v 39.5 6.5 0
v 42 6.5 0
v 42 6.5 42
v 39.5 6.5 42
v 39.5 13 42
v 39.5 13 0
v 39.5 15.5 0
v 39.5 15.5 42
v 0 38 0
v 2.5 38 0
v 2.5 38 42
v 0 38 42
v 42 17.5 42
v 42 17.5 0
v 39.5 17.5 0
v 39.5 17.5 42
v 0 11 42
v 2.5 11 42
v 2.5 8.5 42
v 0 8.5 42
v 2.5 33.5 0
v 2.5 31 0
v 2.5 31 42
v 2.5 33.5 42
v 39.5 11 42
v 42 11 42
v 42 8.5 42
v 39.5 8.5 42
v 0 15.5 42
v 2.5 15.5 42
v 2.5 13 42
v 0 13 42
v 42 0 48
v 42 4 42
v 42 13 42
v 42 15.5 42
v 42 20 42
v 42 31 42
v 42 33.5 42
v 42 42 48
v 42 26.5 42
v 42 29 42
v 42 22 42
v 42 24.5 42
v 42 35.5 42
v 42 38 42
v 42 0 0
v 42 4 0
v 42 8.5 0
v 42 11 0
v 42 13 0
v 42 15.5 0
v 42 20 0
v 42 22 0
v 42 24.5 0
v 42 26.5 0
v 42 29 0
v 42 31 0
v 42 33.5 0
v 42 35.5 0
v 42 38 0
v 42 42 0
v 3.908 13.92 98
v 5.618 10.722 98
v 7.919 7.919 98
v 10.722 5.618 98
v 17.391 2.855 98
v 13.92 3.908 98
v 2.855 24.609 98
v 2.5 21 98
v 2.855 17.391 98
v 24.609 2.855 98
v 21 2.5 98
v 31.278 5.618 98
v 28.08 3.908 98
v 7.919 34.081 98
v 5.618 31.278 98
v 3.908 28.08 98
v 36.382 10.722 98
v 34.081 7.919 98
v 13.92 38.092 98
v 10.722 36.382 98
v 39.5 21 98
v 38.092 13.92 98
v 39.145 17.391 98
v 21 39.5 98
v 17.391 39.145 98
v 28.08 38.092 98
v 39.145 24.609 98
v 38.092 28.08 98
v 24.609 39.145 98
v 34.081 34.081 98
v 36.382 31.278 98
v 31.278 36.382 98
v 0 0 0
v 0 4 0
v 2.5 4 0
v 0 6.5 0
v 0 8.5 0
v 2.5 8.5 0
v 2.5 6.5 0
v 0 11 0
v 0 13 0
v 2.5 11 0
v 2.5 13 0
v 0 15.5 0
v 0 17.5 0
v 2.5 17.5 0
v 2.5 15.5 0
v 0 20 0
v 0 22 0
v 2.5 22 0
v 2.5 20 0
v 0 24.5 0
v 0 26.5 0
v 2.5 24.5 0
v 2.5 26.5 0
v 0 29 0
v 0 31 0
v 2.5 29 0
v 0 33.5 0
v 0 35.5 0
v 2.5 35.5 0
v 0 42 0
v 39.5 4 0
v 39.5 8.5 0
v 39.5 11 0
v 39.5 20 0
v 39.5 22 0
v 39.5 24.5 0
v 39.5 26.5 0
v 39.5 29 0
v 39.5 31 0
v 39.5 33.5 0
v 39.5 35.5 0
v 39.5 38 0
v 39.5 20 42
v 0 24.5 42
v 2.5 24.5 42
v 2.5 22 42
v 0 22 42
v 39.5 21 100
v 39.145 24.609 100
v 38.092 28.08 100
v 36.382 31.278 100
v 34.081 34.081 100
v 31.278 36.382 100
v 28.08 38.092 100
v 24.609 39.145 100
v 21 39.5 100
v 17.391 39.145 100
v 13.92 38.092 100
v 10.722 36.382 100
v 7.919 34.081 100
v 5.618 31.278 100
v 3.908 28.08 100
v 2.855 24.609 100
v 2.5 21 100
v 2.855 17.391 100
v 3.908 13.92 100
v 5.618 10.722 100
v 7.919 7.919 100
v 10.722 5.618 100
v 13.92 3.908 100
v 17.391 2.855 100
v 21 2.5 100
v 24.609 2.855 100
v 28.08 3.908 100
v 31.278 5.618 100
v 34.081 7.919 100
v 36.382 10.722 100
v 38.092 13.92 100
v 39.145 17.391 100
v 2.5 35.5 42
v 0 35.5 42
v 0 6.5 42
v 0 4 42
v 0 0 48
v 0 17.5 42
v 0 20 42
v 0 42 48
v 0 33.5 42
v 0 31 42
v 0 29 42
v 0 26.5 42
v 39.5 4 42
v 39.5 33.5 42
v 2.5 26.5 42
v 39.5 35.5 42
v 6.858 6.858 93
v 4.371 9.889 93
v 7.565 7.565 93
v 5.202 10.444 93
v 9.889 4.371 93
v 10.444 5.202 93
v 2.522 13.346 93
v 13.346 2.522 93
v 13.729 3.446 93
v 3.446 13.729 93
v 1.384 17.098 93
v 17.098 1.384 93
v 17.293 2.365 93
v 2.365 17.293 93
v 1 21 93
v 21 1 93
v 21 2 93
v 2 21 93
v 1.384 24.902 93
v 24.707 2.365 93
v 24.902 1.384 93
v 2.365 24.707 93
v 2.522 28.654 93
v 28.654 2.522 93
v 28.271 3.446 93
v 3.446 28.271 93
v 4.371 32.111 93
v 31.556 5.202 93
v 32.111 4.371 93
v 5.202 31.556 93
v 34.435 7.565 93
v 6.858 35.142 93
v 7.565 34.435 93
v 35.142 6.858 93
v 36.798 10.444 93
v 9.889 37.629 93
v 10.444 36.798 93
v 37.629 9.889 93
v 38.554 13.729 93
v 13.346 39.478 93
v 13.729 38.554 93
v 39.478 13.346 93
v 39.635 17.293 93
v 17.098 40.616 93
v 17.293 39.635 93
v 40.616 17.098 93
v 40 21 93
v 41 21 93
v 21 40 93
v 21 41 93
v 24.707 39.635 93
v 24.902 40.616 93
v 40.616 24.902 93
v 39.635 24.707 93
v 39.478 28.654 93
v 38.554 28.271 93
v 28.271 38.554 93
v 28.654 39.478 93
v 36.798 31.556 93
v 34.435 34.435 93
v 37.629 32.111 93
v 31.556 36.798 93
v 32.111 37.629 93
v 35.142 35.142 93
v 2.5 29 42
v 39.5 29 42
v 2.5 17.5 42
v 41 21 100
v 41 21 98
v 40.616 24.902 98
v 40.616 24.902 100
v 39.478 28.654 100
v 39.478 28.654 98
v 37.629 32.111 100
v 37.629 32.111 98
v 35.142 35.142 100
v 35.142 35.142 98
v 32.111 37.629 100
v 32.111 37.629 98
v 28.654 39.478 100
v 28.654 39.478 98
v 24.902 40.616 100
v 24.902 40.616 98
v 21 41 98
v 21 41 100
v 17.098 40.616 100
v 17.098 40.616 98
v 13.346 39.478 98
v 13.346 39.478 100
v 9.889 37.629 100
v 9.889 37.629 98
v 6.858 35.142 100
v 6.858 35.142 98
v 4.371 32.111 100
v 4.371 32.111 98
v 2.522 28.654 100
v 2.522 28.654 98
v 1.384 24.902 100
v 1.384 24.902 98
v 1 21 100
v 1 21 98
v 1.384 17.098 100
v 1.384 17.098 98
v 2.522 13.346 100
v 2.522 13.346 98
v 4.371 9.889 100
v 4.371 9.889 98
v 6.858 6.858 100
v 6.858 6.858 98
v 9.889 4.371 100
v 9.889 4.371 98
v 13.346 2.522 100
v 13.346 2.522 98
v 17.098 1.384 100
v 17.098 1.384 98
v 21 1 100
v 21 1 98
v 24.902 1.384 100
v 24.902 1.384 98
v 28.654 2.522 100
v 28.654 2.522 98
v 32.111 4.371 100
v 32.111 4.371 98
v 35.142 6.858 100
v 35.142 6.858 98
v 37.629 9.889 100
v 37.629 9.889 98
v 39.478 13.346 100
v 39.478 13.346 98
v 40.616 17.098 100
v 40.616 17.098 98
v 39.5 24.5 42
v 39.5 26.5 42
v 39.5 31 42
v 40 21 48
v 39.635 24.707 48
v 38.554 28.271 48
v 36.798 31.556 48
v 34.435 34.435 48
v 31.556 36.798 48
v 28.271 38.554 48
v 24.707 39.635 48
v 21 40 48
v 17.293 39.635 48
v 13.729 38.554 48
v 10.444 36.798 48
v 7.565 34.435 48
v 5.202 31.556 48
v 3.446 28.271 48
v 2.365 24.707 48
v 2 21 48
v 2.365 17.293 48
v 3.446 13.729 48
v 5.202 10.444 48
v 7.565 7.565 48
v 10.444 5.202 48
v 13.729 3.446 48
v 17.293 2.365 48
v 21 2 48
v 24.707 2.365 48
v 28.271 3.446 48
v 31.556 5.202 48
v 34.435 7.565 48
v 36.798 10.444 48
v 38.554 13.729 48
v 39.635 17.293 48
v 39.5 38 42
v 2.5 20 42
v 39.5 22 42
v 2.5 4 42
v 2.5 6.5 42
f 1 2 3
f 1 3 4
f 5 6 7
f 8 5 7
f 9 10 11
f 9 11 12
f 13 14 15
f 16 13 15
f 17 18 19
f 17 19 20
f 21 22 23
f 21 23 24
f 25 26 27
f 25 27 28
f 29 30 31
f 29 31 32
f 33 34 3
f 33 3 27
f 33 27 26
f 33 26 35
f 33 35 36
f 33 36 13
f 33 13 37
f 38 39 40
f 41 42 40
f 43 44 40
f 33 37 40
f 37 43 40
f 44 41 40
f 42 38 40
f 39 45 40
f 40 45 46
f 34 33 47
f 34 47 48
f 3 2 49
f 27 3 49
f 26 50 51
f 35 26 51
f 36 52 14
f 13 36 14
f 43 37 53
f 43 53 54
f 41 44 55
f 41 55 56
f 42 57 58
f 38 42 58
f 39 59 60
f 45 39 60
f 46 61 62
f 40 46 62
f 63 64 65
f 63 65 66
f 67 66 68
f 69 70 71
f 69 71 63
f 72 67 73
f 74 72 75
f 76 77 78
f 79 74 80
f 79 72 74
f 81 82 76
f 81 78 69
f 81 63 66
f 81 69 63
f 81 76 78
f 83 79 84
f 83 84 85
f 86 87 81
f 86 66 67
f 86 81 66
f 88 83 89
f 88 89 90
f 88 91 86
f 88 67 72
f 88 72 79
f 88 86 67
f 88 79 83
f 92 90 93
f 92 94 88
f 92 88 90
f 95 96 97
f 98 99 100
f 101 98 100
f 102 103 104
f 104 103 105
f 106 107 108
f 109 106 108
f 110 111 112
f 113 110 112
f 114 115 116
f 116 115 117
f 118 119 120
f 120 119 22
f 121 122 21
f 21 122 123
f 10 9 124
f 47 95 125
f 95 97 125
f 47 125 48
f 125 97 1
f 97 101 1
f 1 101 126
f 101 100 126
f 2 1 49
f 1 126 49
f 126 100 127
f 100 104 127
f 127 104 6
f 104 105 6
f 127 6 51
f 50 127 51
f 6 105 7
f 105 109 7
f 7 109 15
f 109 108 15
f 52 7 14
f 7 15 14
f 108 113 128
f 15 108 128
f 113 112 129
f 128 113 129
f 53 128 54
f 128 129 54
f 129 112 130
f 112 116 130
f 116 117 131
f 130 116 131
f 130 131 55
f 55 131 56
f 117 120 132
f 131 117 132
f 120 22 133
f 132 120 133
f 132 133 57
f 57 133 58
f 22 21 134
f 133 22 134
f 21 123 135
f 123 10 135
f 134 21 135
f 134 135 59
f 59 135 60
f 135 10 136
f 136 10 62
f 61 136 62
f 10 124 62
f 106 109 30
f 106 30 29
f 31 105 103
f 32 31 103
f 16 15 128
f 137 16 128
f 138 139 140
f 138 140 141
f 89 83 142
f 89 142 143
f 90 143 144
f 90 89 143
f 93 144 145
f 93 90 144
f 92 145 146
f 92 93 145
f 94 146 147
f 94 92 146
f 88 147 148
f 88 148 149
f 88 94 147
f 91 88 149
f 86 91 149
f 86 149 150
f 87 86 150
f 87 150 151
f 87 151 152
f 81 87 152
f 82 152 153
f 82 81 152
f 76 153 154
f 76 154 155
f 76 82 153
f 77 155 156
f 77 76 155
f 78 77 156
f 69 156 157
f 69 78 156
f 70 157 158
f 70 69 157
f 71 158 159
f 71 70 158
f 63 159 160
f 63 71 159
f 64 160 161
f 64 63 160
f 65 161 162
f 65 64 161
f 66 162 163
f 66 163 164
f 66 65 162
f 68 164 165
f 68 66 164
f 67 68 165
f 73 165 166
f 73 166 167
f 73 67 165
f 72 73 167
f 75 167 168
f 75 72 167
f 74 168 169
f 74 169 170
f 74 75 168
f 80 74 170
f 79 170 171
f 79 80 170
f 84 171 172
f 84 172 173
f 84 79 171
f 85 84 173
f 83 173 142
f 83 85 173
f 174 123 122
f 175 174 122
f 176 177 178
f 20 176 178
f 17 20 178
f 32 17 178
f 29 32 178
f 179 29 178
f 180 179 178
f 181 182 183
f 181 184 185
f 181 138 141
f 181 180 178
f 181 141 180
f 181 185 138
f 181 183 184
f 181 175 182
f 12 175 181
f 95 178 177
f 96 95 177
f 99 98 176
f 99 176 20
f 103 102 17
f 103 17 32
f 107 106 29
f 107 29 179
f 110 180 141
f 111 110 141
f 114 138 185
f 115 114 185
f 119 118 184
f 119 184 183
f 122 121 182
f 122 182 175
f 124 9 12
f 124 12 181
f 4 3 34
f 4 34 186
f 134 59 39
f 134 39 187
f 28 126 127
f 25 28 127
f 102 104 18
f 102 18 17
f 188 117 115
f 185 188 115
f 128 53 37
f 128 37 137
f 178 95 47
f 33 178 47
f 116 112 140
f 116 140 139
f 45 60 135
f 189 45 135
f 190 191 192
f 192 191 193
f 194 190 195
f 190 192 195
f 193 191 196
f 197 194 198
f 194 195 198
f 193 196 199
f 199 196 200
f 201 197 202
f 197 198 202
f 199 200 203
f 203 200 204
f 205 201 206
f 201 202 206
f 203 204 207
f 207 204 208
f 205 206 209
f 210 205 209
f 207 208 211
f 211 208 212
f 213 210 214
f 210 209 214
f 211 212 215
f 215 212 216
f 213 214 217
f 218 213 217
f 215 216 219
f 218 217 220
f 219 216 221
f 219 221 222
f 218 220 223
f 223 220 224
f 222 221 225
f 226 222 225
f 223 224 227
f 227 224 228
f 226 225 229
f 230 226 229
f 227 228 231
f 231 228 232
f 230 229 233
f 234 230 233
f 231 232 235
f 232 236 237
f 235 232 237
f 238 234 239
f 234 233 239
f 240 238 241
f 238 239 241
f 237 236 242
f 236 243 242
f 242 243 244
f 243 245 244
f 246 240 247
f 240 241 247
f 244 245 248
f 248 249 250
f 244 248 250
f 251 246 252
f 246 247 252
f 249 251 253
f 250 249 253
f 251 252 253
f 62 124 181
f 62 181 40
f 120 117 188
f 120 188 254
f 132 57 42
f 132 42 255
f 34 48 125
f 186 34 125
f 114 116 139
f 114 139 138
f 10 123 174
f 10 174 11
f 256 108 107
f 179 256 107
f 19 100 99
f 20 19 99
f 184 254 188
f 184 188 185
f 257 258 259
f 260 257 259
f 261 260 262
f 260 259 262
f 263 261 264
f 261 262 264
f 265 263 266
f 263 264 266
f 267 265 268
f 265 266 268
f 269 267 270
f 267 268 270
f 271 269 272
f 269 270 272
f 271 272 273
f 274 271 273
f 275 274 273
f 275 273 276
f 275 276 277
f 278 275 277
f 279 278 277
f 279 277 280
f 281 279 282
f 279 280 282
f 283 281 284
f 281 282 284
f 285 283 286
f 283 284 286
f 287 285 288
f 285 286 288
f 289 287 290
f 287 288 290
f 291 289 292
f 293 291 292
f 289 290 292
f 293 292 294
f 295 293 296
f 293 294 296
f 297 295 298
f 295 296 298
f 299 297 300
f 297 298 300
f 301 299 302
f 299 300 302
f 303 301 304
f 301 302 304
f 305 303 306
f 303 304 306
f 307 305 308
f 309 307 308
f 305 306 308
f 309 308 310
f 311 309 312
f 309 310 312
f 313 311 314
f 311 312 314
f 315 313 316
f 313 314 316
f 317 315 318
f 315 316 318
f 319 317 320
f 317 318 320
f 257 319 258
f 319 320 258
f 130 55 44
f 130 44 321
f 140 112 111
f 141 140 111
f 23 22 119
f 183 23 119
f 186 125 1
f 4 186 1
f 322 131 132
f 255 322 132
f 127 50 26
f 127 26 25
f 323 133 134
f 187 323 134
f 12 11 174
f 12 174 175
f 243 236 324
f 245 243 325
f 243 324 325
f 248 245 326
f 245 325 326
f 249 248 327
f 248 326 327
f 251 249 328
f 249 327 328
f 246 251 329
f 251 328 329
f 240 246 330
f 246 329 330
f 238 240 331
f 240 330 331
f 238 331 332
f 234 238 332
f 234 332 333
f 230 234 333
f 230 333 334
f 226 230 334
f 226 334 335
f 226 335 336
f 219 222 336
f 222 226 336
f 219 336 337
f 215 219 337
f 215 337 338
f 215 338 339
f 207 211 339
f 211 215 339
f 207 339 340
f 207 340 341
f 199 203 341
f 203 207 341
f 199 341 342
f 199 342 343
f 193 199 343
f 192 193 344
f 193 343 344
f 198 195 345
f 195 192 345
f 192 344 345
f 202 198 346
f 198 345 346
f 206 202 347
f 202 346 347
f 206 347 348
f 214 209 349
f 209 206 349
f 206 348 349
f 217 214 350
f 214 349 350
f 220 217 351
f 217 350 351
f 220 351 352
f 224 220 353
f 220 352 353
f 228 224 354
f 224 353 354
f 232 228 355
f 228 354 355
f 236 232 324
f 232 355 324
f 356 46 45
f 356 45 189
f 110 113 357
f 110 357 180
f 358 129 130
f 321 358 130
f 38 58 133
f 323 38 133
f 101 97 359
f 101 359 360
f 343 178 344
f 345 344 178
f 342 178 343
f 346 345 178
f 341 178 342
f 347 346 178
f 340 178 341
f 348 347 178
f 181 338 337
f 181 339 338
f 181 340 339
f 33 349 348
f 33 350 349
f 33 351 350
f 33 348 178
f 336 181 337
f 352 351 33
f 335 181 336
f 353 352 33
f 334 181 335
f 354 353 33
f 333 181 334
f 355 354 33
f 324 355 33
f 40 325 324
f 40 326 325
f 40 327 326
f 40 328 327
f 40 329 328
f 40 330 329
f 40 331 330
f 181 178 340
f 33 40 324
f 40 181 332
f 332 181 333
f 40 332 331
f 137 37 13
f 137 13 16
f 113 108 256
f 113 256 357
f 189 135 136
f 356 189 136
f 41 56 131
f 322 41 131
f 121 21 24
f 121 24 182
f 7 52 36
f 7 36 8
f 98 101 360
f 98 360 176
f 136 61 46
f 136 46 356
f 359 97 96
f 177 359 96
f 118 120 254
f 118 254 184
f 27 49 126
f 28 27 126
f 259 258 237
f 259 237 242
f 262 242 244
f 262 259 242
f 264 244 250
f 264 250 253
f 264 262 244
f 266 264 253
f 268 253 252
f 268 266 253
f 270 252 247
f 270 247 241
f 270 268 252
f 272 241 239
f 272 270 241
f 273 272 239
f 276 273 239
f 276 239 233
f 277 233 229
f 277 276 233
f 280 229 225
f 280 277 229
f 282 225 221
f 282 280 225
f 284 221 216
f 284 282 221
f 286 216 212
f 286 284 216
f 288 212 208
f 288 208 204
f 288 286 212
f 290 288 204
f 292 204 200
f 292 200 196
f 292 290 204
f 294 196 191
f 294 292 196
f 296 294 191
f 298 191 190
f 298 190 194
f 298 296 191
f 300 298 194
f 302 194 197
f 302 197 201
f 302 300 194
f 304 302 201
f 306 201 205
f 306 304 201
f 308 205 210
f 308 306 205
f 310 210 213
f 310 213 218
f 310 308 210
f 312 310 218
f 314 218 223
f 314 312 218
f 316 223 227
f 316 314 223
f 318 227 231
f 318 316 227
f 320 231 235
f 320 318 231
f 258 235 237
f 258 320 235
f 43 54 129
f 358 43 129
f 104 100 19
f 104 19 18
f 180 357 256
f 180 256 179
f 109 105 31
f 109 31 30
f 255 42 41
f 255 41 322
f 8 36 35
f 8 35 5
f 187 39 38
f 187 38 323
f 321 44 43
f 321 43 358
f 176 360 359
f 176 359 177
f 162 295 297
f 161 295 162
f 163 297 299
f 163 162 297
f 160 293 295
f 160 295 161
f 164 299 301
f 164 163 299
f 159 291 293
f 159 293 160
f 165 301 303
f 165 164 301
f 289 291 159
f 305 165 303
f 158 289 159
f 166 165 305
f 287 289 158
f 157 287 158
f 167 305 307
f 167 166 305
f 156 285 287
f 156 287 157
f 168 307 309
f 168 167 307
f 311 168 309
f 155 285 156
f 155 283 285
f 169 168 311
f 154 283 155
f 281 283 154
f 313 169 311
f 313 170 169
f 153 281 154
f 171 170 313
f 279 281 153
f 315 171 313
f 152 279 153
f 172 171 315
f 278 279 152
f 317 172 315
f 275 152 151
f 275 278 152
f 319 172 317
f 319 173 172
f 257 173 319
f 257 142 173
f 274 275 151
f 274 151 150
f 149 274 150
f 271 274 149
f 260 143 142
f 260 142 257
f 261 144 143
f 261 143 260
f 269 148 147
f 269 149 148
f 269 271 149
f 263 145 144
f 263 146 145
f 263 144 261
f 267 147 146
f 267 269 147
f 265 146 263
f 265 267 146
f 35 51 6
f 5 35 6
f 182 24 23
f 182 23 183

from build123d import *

# Parameters (mm, degrees)
SKETCH2_W           = 42
SKETCH2_H           = 42
BOSS_EXTRUDE1_DEPTH = 48
SKETCH3_R           = 19
BOSS_EXTRUDE2_DEPTH = 50
SKETCH4_R           = 20
SKETCH4_R_2         = 18.5
BOSS_EXTRUDE3_DEPTH = 5
SKETCH5_R           = 20
SKETCH5_R_2         = 18.5
BOSS_EXTRUDE4_DEPTH = 2
SKETCH6_W           = 2.5
SKETCH6_H           = 2.5
CUT_EXTRUDE1_DEPTH  = 42


with BuildPart() as part:
    # Sketch2 → Boss-Extrude1 (new body)
    with BuildSketch(Plane.XY):
        with Locations((21, 21)):
            Rectangle(SKETCH2_W, SKETCH2_H)
    extrude(amount=BOSS_EXTRUDE1_DEPTH)

    # Sketch3 → Boss-Extrude2 (add)
    with BuildSketch(Plane.XY.offset(48)):
        with Locations((21, 21)):
            Circle(SKETCH3_R)
    extrude(amount=BOSS_EXTRUDE2_DEPTH)



with BuildPart() as body_2:
    # Sketch4 → Boss-Extrude3 (new body)
    with BuildSketch(Plane.XY.offset(98)):
        with Locations((21, 21)):
            Circle(SKETCH4_R)
        with Locations((21, 21)):
            Circle(SKETCH4_R_2, mode=Mode.SUBTRACT)
    extrude(amount=-BOSS_EXTRUDE3_DEPTH)


with BuildPart() as part_1:
    add(part.part)

    add(body_2.part)  # Boss-Extrude4 merges body 2
    # Sketch5 → Boss-Extrude4 (add)
    with BuildSketch(Plane.XY.offset(98)):
        with Locations((21, 21)):
            Circle(SKETCH5_R)
        with Locations((21, 21)):
            Circle(SKETCH5_R_2, mode=Mode.SUBTRACT)
    extrude(amount=BOSS_EXTRUDE4_DEPTH)

    # Sketch6 → Cut-Extrude1 (cut)
    with BuildSketch(Plane(origin=(0, 0, 0), x_dir=(-1, 0, 0), z_dir=(0, 0, -1))):
        with Locations((-40.75, 36.75)):
            Rectangle(SKETCH6_W, SKETCH6_H)
        with Locations((-40.75, 5.25)):
            Rectangle(SKETCH6_W, SKETCH6_H)
        with Locations((-40.75, 32.25)):
            Rectangle(SKETCH6_W, SKETCH6_H)
        with Locations((-40.75, 23.25)):
            Rectangle(SKETCH6_W, SKETCH6_H)
        with Locations((-40.75, 18.75)):
            Rectangle(SKETCH6_W, SKETCH6_H)
        with Locations((-40.75, 14.25)):
            Rectangle(SKETCH6_W, SKETCH6_H)
        with Locations((-40.75, 9.75)):
            Rectangle(SKETCH6_W, SKETCH6_H)
        with Locations((-40.75, 27.75)):
            Rectangle(SKETCH6_W, SKETCH6_H)
        with Locations((-1.25, 5.25)):
            Rectangle(SKETCH6_W, SKETCH6_H)
        with Locations((-1.25, 27.75)):
            Rectangle(SKETCH6_W, SKETCH6_H)
        with Locations((-1.25, 9.75)):
            Rectangle(SKETCH6_W, SKETCH6_H)
        with Locations((-1.25, 14.25)):
            Rectangle(SKETCH6_W, SKETCH6_H)
        with Locations((-1.25, 18.75)):
            Rectangle(SKETCH6_W, SKETCH6_H)
        with Locations((-1.25, 23.25)):
            Rectangle(SKETCH6_W, SKETCH6_H)
        with Locations((-1.25, 32.25)):
            Rectangle(SKETCH6_W, SKETCH6_H)
        with Locations((-1.25, 36.75)):
            Rectangle(SKETCH6_W, SKETCH6_H)
    extrude(amount=-CUT_EXTRUDE1_DEPTH, mode=Mode.SUBTRACT)


solid = part_1.part
